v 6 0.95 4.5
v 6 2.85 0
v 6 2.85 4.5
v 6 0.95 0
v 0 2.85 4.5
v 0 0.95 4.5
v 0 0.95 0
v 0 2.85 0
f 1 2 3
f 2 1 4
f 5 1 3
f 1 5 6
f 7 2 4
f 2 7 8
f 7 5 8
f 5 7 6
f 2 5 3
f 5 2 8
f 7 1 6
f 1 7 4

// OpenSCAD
difference() {
	translate(v = [0, 0.9500000000, 0]) {
		cube(size = [6.0000000000, 1.9000000000, 4.5000000000]);
	}
	scale(v = [6.0000000000, 1.9000000000, 1]) {
		cylinder(h = 5.0000000000, r = 0.5000000000);
	}
}
